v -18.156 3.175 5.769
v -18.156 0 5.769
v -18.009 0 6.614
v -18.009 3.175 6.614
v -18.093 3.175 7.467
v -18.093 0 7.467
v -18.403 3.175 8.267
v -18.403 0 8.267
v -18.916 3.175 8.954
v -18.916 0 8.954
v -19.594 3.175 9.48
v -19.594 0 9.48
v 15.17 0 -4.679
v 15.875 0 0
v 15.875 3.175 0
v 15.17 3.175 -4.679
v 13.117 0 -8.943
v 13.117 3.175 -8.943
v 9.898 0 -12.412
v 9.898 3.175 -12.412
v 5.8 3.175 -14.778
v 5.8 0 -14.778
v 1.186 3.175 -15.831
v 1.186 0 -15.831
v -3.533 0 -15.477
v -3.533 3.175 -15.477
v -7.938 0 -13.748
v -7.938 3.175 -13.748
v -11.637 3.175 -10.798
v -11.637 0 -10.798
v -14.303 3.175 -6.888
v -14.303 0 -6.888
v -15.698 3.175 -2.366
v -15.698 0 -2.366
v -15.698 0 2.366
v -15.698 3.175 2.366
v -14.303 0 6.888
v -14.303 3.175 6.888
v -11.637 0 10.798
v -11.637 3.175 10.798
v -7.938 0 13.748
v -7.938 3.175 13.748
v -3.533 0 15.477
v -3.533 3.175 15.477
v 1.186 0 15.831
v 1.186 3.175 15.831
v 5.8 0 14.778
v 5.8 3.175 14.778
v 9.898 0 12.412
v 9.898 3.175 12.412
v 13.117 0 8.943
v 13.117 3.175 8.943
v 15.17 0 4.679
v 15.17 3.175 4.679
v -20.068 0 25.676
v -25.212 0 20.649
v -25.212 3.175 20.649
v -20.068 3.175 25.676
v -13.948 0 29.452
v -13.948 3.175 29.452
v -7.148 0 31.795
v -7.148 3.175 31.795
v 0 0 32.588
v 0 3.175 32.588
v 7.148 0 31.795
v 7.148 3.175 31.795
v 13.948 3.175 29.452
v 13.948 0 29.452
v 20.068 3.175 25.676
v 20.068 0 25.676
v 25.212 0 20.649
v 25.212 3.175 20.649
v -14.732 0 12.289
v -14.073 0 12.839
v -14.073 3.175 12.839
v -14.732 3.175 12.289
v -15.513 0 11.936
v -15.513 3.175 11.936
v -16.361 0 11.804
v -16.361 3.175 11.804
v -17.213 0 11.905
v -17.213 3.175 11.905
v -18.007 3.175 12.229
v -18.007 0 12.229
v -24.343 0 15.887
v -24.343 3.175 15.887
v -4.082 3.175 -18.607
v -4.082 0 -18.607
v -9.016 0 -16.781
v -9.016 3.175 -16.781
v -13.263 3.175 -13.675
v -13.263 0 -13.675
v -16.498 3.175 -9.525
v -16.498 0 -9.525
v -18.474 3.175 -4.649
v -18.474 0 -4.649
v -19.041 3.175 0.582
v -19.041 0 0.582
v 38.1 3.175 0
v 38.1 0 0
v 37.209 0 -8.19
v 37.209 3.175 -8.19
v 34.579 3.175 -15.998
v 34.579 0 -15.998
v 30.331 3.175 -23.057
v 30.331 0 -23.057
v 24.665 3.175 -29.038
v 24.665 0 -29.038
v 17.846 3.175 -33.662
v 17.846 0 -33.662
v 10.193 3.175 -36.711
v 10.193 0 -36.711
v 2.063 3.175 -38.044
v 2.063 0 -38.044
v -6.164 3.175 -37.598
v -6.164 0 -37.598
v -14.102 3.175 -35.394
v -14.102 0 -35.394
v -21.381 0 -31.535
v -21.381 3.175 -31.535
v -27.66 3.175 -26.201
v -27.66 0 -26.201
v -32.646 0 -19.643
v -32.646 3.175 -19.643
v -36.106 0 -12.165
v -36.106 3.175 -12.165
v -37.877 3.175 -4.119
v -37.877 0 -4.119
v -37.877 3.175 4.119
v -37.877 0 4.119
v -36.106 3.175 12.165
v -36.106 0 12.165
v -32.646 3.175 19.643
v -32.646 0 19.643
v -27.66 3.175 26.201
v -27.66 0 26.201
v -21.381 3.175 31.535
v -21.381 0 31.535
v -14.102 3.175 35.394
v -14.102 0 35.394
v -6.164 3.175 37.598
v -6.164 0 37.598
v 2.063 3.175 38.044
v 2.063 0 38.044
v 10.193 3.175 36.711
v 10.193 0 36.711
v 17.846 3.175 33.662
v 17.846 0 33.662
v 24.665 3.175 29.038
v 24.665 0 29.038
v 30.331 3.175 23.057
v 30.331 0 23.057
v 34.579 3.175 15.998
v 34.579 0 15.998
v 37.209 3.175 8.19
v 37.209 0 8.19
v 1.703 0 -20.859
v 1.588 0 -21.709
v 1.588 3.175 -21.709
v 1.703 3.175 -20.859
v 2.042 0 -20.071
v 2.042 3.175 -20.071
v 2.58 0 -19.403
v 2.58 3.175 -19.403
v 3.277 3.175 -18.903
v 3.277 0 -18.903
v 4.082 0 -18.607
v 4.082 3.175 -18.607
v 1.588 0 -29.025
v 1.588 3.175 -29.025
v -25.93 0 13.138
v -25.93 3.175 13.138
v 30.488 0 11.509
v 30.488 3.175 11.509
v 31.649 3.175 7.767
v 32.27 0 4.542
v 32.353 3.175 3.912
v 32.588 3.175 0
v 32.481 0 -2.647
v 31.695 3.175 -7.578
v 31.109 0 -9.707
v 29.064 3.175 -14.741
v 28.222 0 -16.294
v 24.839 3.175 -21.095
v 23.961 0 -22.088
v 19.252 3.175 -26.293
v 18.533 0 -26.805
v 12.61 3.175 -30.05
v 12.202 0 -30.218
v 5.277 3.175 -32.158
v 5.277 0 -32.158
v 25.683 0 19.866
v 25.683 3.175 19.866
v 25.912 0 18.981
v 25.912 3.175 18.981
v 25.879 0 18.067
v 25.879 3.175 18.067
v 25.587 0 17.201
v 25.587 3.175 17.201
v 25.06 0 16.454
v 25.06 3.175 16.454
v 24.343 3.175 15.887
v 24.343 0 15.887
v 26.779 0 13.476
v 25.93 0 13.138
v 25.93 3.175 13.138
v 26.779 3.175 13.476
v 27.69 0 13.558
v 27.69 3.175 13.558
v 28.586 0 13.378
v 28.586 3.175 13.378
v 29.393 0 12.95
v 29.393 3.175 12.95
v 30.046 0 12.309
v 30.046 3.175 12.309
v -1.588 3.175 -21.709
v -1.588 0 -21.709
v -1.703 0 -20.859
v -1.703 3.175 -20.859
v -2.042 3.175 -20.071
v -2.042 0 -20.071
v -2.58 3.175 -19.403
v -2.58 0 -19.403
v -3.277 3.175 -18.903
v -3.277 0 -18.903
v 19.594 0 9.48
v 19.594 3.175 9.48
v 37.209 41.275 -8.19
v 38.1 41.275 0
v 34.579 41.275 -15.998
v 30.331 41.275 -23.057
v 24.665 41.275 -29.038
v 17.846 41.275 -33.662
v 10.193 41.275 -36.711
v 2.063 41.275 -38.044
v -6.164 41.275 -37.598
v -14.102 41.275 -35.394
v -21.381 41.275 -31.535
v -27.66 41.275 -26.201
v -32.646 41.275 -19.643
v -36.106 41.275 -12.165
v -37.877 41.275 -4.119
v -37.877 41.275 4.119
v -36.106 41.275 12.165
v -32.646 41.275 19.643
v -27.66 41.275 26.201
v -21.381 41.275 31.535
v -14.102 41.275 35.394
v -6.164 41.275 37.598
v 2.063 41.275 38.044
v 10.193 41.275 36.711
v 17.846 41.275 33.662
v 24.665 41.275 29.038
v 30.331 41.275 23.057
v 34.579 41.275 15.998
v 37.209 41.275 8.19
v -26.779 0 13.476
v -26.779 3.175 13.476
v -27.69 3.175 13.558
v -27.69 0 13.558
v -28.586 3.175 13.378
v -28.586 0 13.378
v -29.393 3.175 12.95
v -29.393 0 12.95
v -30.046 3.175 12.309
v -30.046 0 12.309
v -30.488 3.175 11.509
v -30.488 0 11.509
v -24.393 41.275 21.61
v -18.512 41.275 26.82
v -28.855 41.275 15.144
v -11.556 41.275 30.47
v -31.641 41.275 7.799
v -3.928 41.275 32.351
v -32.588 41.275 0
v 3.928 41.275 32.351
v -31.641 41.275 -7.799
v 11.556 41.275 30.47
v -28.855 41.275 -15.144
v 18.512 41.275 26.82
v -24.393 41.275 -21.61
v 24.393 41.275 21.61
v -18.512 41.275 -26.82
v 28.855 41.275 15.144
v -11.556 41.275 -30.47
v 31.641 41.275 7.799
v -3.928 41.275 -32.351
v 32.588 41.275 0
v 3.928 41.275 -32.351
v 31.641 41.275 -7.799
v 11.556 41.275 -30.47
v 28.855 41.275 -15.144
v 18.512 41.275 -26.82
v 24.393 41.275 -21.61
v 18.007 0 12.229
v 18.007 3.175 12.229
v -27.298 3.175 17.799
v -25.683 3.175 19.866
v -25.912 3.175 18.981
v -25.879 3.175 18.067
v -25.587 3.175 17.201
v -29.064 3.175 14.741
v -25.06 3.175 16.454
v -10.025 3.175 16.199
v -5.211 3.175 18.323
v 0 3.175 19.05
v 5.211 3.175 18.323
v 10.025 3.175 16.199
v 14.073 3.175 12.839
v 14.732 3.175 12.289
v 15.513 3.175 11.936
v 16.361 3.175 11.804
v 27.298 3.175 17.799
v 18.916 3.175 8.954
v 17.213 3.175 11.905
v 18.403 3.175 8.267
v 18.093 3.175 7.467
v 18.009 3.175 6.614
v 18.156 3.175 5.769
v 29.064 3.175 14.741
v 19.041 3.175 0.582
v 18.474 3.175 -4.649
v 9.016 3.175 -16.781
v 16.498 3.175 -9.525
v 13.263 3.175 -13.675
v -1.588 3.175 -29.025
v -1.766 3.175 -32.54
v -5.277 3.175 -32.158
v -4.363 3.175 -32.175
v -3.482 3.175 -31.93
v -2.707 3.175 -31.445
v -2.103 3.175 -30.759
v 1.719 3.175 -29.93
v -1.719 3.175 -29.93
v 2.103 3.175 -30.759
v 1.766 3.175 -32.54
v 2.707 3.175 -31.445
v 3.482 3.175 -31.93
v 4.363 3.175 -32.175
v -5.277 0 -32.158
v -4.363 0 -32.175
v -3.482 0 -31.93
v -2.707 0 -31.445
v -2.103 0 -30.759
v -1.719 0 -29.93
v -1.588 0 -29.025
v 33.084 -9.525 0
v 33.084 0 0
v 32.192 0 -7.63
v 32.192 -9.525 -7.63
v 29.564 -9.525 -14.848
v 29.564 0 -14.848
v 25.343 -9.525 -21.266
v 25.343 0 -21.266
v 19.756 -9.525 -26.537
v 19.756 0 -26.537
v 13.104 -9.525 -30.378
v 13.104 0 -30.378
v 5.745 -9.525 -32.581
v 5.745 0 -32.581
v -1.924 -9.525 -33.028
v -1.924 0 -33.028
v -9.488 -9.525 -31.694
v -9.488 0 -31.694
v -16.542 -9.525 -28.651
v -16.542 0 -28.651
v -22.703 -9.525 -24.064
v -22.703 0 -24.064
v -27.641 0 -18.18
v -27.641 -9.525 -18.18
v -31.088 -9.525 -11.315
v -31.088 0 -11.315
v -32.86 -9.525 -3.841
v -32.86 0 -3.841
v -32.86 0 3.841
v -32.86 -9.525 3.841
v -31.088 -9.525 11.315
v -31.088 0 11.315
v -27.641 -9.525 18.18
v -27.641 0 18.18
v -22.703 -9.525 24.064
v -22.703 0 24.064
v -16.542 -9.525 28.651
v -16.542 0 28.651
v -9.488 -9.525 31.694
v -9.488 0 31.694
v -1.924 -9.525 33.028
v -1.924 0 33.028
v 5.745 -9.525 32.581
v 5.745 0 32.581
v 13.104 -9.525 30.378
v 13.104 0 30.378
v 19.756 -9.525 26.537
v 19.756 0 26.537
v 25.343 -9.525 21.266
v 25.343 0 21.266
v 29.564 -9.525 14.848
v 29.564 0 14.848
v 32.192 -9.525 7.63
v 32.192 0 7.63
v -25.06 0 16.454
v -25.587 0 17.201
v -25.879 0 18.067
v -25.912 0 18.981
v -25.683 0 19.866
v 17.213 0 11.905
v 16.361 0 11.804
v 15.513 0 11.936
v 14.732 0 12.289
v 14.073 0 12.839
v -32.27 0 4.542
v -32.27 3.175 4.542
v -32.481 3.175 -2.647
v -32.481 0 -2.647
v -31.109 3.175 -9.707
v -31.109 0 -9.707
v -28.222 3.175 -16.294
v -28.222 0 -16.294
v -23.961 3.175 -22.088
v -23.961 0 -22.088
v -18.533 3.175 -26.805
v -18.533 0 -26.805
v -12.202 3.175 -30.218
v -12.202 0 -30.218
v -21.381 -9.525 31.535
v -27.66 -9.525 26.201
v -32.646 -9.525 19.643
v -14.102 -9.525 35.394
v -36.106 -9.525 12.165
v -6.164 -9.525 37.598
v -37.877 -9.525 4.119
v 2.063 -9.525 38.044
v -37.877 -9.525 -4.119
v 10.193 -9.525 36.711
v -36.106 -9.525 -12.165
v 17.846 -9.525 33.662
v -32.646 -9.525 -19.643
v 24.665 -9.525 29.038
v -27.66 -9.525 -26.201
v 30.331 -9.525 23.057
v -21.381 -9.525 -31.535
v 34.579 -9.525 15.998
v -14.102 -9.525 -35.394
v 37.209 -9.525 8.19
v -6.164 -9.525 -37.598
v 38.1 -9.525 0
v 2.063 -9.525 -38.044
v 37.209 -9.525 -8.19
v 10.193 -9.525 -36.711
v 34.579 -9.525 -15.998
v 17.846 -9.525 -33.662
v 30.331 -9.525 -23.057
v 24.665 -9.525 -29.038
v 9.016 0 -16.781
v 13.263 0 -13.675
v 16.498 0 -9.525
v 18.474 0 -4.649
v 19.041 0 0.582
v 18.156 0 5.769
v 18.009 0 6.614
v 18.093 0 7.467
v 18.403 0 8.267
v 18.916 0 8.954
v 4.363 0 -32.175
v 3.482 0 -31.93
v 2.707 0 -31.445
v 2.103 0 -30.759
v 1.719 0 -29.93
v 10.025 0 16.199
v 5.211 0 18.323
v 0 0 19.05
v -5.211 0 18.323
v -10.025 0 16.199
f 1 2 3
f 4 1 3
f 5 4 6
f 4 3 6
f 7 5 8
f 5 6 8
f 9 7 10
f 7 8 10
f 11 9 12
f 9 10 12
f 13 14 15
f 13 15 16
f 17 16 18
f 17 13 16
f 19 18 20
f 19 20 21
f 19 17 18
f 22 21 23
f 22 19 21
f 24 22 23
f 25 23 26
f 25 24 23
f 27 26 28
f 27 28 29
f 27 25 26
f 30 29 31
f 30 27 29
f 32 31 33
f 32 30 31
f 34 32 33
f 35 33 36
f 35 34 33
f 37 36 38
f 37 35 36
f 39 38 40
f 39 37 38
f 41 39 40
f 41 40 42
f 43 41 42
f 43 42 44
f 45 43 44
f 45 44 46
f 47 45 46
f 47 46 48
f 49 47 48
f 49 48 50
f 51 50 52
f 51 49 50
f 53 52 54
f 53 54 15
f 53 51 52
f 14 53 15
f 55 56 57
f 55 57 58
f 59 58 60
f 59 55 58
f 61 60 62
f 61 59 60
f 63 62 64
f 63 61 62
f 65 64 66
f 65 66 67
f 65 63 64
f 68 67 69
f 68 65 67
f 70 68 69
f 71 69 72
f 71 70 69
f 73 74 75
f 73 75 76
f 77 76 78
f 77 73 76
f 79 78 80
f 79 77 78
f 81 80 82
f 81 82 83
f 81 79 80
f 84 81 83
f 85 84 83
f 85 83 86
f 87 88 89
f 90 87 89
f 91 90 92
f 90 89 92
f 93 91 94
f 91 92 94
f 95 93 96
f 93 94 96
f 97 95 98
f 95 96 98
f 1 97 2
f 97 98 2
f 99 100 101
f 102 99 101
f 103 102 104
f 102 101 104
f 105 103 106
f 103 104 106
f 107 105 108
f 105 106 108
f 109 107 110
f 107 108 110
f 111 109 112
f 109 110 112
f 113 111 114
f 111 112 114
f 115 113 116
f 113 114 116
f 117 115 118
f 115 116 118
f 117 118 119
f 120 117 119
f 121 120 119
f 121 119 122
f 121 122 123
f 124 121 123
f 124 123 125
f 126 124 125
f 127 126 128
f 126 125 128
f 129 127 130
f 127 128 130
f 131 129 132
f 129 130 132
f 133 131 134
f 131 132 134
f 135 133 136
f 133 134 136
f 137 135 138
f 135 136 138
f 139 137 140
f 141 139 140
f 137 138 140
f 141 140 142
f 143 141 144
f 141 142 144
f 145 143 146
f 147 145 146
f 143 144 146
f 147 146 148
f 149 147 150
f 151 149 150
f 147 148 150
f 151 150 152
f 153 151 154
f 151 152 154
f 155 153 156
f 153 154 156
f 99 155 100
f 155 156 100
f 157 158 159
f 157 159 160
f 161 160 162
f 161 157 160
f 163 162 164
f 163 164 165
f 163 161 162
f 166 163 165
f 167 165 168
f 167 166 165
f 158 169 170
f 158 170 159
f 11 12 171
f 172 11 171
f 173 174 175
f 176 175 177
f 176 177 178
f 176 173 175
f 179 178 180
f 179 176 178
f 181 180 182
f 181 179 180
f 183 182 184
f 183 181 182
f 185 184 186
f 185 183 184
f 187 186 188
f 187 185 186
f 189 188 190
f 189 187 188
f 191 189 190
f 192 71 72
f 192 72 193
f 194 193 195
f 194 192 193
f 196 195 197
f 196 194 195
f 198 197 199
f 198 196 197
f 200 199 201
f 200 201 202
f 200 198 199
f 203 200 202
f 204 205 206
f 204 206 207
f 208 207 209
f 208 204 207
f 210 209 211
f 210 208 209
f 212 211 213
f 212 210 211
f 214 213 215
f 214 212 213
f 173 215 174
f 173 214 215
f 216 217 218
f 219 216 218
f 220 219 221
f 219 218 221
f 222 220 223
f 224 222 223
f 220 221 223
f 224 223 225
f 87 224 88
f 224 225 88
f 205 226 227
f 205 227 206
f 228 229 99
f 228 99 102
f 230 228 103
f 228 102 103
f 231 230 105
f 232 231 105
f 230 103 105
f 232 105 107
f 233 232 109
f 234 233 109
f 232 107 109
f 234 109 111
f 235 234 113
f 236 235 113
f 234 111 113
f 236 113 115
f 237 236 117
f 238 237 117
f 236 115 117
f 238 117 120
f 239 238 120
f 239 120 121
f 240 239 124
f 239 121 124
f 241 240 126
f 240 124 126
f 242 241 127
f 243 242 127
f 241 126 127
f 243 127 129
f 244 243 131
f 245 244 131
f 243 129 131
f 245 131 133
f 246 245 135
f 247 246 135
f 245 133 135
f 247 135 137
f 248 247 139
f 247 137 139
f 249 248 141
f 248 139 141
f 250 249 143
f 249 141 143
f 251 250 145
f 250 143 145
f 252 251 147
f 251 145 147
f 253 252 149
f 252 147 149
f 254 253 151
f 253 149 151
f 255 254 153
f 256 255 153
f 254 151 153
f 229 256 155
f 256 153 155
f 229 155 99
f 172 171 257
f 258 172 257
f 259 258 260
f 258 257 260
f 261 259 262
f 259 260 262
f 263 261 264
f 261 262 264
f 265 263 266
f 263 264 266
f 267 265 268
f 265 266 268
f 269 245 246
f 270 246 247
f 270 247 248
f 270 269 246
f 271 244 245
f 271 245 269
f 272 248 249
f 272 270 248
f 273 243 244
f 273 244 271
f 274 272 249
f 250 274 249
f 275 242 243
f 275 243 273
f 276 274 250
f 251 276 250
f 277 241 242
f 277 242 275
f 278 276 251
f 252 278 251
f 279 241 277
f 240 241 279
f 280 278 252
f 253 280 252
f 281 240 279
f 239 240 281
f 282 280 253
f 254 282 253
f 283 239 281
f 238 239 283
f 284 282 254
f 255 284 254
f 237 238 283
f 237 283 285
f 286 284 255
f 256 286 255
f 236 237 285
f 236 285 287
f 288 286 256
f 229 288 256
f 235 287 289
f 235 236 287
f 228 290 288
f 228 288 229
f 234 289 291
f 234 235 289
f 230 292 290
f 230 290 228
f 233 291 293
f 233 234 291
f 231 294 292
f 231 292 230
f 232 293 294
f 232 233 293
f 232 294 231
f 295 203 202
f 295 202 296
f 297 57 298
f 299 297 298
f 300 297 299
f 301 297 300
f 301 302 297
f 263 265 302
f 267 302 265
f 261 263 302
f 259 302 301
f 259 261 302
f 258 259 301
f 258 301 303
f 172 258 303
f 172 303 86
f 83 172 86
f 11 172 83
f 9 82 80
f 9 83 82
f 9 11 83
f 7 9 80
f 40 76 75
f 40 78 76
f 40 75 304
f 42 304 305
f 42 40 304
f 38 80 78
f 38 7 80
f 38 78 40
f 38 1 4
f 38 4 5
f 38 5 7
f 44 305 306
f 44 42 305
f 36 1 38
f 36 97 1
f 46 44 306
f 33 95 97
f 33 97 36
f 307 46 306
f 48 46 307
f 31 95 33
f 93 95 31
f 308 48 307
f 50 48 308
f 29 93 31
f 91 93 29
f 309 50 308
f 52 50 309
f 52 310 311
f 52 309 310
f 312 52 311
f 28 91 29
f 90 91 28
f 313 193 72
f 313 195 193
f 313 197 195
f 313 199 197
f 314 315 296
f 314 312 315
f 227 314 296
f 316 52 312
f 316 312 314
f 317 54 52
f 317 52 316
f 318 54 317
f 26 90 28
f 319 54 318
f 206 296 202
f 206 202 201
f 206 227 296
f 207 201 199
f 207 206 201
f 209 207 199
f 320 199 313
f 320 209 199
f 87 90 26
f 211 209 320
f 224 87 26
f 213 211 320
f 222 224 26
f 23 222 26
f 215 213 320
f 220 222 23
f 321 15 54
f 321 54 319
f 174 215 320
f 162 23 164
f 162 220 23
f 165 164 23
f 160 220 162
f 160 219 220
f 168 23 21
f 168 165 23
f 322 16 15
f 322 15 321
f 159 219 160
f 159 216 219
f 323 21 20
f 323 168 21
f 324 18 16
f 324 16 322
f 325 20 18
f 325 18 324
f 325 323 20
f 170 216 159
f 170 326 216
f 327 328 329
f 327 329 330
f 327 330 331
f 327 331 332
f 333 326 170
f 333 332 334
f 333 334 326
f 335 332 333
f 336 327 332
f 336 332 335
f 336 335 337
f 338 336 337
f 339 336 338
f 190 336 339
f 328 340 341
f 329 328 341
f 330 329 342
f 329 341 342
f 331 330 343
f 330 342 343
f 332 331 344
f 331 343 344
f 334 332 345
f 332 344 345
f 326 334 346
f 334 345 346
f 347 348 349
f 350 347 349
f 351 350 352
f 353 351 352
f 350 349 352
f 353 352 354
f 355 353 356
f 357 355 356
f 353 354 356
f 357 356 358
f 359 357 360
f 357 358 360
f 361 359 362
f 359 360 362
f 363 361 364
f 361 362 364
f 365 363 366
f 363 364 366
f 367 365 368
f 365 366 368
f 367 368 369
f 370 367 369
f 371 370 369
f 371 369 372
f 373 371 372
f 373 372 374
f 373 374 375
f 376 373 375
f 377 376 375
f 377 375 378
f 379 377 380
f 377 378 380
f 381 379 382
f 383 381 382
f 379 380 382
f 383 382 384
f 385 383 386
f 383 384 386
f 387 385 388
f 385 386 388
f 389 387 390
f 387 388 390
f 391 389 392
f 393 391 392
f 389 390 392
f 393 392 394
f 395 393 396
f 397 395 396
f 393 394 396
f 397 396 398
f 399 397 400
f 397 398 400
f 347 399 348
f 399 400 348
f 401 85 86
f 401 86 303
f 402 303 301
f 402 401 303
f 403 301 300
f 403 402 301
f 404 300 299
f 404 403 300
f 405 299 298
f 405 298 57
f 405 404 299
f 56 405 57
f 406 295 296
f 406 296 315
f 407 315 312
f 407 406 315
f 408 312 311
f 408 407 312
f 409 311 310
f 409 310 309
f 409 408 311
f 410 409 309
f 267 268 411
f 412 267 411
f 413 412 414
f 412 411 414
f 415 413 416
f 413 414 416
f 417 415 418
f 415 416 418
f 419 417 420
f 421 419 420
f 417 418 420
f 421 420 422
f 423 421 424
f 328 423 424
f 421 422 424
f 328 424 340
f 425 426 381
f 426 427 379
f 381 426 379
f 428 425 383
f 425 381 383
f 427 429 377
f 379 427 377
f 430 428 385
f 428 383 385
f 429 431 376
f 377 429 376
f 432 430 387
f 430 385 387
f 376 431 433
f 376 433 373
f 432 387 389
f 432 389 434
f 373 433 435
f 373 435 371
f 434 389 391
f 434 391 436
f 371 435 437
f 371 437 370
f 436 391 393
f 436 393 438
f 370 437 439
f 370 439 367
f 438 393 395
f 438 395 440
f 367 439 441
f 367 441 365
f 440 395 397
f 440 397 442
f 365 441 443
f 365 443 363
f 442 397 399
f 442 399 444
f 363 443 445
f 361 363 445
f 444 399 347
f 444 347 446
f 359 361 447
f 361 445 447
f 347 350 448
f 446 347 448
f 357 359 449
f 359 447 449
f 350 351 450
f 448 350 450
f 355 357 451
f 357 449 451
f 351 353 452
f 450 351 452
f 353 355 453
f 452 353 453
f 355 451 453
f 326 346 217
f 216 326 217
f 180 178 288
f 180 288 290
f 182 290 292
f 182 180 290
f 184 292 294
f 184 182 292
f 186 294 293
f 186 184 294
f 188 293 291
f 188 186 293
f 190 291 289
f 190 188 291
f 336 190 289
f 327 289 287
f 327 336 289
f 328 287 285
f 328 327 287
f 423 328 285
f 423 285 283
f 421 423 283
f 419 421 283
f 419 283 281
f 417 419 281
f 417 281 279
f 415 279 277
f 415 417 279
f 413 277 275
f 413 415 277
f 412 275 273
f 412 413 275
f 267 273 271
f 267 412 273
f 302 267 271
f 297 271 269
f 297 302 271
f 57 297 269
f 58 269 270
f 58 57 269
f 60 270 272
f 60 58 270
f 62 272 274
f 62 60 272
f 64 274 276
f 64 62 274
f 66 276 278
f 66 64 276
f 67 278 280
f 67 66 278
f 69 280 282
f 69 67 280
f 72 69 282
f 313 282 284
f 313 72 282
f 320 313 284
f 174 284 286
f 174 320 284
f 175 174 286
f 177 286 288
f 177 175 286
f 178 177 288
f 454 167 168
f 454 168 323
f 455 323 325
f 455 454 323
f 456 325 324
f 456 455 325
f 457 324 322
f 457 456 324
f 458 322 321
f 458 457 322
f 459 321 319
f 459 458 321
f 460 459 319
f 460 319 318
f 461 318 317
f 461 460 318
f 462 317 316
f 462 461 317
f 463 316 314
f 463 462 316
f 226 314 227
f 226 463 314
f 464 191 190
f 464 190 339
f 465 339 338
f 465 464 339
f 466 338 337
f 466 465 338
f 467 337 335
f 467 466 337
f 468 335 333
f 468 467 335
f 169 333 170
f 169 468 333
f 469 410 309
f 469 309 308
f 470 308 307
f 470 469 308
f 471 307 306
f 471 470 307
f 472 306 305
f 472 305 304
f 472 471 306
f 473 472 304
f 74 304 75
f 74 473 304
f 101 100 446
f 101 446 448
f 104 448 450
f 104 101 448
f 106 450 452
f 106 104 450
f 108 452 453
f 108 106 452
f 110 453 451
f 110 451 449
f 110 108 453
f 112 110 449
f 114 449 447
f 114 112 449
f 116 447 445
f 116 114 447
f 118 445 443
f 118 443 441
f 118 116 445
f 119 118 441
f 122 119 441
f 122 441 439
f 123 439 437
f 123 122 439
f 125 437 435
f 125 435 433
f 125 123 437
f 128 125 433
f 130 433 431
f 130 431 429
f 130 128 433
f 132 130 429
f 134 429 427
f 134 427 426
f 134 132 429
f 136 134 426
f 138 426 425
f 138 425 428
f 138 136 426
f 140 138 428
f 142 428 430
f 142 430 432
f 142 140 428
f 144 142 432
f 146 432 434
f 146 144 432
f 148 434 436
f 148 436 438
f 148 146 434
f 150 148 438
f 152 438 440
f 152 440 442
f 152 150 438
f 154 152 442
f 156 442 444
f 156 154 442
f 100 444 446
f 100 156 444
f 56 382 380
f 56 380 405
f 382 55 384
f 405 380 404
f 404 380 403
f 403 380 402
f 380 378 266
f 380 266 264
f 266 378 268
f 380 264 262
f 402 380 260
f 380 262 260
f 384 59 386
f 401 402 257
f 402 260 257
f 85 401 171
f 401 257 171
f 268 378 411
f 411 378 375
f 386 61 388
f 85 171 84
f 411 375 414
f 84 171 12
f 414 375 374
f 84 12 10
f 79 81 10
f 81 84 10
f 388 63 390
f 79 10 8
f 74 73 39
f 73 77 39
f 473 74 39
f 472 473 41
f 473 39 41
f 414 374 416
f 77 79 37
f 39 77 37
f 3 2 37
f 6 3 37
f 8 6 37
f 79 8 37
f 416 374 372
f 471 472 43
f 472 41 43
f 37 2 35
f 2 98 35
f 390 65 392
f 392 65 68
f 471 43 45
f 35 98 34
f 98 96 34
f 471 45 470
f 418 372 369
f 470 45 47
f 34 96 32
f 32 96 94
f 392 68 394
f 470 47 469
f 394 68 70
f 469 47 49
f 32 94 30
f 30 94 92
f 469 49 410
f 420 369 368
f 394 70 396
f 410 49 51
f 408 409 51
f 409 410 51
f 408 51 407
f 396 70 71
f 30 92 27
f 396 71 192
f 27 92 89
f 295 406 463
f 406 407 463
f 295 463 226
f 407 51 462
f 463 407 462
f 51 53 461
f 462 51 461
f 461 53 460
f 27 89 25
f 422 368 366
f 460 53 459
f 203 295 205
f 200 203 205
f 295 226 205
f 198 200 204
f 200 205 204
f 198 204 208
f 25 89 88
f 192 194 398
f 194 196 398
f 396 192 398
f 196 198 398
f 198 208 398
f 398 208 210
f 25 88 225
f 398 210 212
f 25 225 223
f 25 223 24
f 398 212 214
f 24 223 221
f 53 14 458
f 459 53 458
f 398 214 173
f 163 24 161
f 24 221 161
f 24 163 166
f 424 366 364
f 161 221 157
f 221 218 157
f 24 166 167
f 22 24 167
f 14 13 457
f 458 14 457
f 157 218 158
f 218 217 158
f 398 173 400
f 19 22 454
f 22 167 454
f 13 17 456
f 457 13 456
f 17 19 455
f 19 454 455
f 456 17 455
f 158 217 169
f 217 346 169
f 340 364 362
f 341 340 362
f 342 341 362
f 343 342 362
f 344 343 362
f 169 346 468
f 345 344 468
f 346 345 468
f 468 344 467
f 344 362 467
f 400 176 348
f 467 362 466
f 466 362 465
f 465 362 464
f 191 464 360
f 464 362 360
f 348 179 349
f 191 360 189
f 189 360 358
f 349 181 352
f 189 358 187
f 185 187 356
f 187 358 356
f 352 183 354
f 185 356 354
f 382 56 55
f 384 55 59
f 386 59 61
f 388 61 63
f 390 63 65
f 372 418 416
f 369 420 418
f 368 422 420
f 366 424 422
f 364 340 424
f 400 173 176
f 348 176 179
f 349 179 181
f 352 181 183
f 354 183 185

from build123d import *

# Parameters (mm, degrees)
SKETCH1_R           = 38.1
SKETCH1_R_2         = 33.0835
BOSS_EXTRUDE1_DEPTH = 9.525
SKETCH2_R           = 38.1
SKETCH2_R_2         = 15.875
BOSS_EXTRUDE2_DEPTH = 3.175
SKETCH4_R           = 38.1
SKETCH4_R_2         = 32.5882
BOSS_EXTRUDE3_DEPTH = 38.1


with BuildPart() as part:
    # Sketch1 → Boss-Extrude1 (new body)
    with BuildSketch(Plane(origin=(0, 0, 0), x_dir=(1, 0, 0), z_dir=(0, 1, 0))):
        Circle(SKETCH1_R)
        Circle(SKETCH1_R_2, mode=Mode.SUBTRACT)
    extrude(amount=-BOSS_EXTRUDE1_DEPTH)

    # Sketch2 → Boss-Extrude2 (add)
    with BuildSketch(Plane(origin=(0, 0, 0), x_dir=(1, 0, 0), z_dir=(0, 1, 0))):
        Circle(SKETCH2_R)
        Circle(SKETCH2_R_2, mode=Mode.SUBTRACT)
        with BuildLine():
            Line((-1.5875, 29.025074125), (-1.5875, 21.708736001))
            ThreePointArc((-1.5875, 21.708736001), (-2.288559931, 19.718699434), (-4.082142857, 18.607488001))
            ThreePointArc((-4.082142857, 18.607488001), (-16.497783942, 9.525), (-18.155628738, -5.768504584))
            ThreePointArc((-18.155628738, -5.768504584), (-18.221174605, -7.877398679), (-19.594066861, -9.479552672))
            Line((-19.594066861, -9.479552672), (-25.930201539, -13.137721734))
            ThreePointArc((-25.930201539, -13.137721734), (-28.585844638, -13.378023404), (-30.488092465, -11.509430788))
            ThreePointArc((-30.488092465, -11.509430788), (-28.222209064, 16.2941), (-5.276586788, 32.158177982))
            ThreePointArc((-5.276586788, 32.158177982), (-2.707214199, 31.445079348), (-1.5875, 29.025074125))
        make_face(mode=Mode.SUBTRACT)
        with BuildLine():
            Line((1.5875, 29.025074125), (1.5875, 21.708736001))
            ThreePointArc((1.5875, 21.708736001), (2.288559931, 19.718699434), (4.082142857, 18.607488001))
            ThreePointArc((4.082142857, 18.607488001), (16.497783942, 9.525), (18.155628738, -5.768504584))
            ThreePointArc((18.155628738, -5.768504584), (18.221174605, -7.877398679), (19.594066861, -9.479552672))
            Line((19.594066861, -9.479552672), (25.930201539, -13.137721734))
            ThreePointArc((25.930201539, -13.137721734), (28.585844638, -13.378023404), (30.488092465, -11.509430788))
            ThreePointArc((30.488092465, -11.509430788), (28.222209064, 16.2941), (5.276586788, 32.158177982))
            ThreePointArc((5.276586788, 32.158177982), (2.707214199, 31.445079348), (1.5875, 29.025074125))
        make_face(mode=Mode.SUBTRACT)
        with BuildLine():
            Line((24.342701539, -15.887352391), (18.006566861, -12.229183329))
            ThreePointArc((18.006566861, -12.229183329), (15.932614674, -11.841300756), (14.073485881, -12.838983416))
            ThreePointArc((14.073485881, -12.838983416), (0, -19.05), (-14.073485881, -12.838983416))
            ThreePointArc((-14.073485881, -12.838983416), (-15.932614674, -11.841300756), (-18.006566861, -12.229183329))
            Line((-18.006566861, -12.229183329), (-24.342701539, -15.887352391))
            ThreePointArc((-24.342701539, -15.887352391), (-25.87863044, -18.067055943), (-25.211505678, -20.648747194))
            ThreePointArc((-25.211505678, -20.648747194), (0, -32.5882), (25.211505678, -20.648747194))
            ThreePointArc((25.211505678, -20.648747194), (25.87863044, -18.067055943), (24.342701539, -15.887352391))
        make_face(mode=Mode.SUBTRACT)
    extrude(amount=BOSS_EXTRUDE2_DEPTH)

    # Sketch4 → Boss-Extrude3 (add)
    with BuildSketch(Plane(origin=(0, 3.175, 0), x_dir=(1, 0, 0), z_dir=(0, 1, 0))):
        Circle(SKETCH4_R)
        Circle(SKETCH4_R_2, mode=Mode.SUBTRACT)
    extrude(amount=BOSS_EXTRUDE3_DEPTH)


solid = part.part
